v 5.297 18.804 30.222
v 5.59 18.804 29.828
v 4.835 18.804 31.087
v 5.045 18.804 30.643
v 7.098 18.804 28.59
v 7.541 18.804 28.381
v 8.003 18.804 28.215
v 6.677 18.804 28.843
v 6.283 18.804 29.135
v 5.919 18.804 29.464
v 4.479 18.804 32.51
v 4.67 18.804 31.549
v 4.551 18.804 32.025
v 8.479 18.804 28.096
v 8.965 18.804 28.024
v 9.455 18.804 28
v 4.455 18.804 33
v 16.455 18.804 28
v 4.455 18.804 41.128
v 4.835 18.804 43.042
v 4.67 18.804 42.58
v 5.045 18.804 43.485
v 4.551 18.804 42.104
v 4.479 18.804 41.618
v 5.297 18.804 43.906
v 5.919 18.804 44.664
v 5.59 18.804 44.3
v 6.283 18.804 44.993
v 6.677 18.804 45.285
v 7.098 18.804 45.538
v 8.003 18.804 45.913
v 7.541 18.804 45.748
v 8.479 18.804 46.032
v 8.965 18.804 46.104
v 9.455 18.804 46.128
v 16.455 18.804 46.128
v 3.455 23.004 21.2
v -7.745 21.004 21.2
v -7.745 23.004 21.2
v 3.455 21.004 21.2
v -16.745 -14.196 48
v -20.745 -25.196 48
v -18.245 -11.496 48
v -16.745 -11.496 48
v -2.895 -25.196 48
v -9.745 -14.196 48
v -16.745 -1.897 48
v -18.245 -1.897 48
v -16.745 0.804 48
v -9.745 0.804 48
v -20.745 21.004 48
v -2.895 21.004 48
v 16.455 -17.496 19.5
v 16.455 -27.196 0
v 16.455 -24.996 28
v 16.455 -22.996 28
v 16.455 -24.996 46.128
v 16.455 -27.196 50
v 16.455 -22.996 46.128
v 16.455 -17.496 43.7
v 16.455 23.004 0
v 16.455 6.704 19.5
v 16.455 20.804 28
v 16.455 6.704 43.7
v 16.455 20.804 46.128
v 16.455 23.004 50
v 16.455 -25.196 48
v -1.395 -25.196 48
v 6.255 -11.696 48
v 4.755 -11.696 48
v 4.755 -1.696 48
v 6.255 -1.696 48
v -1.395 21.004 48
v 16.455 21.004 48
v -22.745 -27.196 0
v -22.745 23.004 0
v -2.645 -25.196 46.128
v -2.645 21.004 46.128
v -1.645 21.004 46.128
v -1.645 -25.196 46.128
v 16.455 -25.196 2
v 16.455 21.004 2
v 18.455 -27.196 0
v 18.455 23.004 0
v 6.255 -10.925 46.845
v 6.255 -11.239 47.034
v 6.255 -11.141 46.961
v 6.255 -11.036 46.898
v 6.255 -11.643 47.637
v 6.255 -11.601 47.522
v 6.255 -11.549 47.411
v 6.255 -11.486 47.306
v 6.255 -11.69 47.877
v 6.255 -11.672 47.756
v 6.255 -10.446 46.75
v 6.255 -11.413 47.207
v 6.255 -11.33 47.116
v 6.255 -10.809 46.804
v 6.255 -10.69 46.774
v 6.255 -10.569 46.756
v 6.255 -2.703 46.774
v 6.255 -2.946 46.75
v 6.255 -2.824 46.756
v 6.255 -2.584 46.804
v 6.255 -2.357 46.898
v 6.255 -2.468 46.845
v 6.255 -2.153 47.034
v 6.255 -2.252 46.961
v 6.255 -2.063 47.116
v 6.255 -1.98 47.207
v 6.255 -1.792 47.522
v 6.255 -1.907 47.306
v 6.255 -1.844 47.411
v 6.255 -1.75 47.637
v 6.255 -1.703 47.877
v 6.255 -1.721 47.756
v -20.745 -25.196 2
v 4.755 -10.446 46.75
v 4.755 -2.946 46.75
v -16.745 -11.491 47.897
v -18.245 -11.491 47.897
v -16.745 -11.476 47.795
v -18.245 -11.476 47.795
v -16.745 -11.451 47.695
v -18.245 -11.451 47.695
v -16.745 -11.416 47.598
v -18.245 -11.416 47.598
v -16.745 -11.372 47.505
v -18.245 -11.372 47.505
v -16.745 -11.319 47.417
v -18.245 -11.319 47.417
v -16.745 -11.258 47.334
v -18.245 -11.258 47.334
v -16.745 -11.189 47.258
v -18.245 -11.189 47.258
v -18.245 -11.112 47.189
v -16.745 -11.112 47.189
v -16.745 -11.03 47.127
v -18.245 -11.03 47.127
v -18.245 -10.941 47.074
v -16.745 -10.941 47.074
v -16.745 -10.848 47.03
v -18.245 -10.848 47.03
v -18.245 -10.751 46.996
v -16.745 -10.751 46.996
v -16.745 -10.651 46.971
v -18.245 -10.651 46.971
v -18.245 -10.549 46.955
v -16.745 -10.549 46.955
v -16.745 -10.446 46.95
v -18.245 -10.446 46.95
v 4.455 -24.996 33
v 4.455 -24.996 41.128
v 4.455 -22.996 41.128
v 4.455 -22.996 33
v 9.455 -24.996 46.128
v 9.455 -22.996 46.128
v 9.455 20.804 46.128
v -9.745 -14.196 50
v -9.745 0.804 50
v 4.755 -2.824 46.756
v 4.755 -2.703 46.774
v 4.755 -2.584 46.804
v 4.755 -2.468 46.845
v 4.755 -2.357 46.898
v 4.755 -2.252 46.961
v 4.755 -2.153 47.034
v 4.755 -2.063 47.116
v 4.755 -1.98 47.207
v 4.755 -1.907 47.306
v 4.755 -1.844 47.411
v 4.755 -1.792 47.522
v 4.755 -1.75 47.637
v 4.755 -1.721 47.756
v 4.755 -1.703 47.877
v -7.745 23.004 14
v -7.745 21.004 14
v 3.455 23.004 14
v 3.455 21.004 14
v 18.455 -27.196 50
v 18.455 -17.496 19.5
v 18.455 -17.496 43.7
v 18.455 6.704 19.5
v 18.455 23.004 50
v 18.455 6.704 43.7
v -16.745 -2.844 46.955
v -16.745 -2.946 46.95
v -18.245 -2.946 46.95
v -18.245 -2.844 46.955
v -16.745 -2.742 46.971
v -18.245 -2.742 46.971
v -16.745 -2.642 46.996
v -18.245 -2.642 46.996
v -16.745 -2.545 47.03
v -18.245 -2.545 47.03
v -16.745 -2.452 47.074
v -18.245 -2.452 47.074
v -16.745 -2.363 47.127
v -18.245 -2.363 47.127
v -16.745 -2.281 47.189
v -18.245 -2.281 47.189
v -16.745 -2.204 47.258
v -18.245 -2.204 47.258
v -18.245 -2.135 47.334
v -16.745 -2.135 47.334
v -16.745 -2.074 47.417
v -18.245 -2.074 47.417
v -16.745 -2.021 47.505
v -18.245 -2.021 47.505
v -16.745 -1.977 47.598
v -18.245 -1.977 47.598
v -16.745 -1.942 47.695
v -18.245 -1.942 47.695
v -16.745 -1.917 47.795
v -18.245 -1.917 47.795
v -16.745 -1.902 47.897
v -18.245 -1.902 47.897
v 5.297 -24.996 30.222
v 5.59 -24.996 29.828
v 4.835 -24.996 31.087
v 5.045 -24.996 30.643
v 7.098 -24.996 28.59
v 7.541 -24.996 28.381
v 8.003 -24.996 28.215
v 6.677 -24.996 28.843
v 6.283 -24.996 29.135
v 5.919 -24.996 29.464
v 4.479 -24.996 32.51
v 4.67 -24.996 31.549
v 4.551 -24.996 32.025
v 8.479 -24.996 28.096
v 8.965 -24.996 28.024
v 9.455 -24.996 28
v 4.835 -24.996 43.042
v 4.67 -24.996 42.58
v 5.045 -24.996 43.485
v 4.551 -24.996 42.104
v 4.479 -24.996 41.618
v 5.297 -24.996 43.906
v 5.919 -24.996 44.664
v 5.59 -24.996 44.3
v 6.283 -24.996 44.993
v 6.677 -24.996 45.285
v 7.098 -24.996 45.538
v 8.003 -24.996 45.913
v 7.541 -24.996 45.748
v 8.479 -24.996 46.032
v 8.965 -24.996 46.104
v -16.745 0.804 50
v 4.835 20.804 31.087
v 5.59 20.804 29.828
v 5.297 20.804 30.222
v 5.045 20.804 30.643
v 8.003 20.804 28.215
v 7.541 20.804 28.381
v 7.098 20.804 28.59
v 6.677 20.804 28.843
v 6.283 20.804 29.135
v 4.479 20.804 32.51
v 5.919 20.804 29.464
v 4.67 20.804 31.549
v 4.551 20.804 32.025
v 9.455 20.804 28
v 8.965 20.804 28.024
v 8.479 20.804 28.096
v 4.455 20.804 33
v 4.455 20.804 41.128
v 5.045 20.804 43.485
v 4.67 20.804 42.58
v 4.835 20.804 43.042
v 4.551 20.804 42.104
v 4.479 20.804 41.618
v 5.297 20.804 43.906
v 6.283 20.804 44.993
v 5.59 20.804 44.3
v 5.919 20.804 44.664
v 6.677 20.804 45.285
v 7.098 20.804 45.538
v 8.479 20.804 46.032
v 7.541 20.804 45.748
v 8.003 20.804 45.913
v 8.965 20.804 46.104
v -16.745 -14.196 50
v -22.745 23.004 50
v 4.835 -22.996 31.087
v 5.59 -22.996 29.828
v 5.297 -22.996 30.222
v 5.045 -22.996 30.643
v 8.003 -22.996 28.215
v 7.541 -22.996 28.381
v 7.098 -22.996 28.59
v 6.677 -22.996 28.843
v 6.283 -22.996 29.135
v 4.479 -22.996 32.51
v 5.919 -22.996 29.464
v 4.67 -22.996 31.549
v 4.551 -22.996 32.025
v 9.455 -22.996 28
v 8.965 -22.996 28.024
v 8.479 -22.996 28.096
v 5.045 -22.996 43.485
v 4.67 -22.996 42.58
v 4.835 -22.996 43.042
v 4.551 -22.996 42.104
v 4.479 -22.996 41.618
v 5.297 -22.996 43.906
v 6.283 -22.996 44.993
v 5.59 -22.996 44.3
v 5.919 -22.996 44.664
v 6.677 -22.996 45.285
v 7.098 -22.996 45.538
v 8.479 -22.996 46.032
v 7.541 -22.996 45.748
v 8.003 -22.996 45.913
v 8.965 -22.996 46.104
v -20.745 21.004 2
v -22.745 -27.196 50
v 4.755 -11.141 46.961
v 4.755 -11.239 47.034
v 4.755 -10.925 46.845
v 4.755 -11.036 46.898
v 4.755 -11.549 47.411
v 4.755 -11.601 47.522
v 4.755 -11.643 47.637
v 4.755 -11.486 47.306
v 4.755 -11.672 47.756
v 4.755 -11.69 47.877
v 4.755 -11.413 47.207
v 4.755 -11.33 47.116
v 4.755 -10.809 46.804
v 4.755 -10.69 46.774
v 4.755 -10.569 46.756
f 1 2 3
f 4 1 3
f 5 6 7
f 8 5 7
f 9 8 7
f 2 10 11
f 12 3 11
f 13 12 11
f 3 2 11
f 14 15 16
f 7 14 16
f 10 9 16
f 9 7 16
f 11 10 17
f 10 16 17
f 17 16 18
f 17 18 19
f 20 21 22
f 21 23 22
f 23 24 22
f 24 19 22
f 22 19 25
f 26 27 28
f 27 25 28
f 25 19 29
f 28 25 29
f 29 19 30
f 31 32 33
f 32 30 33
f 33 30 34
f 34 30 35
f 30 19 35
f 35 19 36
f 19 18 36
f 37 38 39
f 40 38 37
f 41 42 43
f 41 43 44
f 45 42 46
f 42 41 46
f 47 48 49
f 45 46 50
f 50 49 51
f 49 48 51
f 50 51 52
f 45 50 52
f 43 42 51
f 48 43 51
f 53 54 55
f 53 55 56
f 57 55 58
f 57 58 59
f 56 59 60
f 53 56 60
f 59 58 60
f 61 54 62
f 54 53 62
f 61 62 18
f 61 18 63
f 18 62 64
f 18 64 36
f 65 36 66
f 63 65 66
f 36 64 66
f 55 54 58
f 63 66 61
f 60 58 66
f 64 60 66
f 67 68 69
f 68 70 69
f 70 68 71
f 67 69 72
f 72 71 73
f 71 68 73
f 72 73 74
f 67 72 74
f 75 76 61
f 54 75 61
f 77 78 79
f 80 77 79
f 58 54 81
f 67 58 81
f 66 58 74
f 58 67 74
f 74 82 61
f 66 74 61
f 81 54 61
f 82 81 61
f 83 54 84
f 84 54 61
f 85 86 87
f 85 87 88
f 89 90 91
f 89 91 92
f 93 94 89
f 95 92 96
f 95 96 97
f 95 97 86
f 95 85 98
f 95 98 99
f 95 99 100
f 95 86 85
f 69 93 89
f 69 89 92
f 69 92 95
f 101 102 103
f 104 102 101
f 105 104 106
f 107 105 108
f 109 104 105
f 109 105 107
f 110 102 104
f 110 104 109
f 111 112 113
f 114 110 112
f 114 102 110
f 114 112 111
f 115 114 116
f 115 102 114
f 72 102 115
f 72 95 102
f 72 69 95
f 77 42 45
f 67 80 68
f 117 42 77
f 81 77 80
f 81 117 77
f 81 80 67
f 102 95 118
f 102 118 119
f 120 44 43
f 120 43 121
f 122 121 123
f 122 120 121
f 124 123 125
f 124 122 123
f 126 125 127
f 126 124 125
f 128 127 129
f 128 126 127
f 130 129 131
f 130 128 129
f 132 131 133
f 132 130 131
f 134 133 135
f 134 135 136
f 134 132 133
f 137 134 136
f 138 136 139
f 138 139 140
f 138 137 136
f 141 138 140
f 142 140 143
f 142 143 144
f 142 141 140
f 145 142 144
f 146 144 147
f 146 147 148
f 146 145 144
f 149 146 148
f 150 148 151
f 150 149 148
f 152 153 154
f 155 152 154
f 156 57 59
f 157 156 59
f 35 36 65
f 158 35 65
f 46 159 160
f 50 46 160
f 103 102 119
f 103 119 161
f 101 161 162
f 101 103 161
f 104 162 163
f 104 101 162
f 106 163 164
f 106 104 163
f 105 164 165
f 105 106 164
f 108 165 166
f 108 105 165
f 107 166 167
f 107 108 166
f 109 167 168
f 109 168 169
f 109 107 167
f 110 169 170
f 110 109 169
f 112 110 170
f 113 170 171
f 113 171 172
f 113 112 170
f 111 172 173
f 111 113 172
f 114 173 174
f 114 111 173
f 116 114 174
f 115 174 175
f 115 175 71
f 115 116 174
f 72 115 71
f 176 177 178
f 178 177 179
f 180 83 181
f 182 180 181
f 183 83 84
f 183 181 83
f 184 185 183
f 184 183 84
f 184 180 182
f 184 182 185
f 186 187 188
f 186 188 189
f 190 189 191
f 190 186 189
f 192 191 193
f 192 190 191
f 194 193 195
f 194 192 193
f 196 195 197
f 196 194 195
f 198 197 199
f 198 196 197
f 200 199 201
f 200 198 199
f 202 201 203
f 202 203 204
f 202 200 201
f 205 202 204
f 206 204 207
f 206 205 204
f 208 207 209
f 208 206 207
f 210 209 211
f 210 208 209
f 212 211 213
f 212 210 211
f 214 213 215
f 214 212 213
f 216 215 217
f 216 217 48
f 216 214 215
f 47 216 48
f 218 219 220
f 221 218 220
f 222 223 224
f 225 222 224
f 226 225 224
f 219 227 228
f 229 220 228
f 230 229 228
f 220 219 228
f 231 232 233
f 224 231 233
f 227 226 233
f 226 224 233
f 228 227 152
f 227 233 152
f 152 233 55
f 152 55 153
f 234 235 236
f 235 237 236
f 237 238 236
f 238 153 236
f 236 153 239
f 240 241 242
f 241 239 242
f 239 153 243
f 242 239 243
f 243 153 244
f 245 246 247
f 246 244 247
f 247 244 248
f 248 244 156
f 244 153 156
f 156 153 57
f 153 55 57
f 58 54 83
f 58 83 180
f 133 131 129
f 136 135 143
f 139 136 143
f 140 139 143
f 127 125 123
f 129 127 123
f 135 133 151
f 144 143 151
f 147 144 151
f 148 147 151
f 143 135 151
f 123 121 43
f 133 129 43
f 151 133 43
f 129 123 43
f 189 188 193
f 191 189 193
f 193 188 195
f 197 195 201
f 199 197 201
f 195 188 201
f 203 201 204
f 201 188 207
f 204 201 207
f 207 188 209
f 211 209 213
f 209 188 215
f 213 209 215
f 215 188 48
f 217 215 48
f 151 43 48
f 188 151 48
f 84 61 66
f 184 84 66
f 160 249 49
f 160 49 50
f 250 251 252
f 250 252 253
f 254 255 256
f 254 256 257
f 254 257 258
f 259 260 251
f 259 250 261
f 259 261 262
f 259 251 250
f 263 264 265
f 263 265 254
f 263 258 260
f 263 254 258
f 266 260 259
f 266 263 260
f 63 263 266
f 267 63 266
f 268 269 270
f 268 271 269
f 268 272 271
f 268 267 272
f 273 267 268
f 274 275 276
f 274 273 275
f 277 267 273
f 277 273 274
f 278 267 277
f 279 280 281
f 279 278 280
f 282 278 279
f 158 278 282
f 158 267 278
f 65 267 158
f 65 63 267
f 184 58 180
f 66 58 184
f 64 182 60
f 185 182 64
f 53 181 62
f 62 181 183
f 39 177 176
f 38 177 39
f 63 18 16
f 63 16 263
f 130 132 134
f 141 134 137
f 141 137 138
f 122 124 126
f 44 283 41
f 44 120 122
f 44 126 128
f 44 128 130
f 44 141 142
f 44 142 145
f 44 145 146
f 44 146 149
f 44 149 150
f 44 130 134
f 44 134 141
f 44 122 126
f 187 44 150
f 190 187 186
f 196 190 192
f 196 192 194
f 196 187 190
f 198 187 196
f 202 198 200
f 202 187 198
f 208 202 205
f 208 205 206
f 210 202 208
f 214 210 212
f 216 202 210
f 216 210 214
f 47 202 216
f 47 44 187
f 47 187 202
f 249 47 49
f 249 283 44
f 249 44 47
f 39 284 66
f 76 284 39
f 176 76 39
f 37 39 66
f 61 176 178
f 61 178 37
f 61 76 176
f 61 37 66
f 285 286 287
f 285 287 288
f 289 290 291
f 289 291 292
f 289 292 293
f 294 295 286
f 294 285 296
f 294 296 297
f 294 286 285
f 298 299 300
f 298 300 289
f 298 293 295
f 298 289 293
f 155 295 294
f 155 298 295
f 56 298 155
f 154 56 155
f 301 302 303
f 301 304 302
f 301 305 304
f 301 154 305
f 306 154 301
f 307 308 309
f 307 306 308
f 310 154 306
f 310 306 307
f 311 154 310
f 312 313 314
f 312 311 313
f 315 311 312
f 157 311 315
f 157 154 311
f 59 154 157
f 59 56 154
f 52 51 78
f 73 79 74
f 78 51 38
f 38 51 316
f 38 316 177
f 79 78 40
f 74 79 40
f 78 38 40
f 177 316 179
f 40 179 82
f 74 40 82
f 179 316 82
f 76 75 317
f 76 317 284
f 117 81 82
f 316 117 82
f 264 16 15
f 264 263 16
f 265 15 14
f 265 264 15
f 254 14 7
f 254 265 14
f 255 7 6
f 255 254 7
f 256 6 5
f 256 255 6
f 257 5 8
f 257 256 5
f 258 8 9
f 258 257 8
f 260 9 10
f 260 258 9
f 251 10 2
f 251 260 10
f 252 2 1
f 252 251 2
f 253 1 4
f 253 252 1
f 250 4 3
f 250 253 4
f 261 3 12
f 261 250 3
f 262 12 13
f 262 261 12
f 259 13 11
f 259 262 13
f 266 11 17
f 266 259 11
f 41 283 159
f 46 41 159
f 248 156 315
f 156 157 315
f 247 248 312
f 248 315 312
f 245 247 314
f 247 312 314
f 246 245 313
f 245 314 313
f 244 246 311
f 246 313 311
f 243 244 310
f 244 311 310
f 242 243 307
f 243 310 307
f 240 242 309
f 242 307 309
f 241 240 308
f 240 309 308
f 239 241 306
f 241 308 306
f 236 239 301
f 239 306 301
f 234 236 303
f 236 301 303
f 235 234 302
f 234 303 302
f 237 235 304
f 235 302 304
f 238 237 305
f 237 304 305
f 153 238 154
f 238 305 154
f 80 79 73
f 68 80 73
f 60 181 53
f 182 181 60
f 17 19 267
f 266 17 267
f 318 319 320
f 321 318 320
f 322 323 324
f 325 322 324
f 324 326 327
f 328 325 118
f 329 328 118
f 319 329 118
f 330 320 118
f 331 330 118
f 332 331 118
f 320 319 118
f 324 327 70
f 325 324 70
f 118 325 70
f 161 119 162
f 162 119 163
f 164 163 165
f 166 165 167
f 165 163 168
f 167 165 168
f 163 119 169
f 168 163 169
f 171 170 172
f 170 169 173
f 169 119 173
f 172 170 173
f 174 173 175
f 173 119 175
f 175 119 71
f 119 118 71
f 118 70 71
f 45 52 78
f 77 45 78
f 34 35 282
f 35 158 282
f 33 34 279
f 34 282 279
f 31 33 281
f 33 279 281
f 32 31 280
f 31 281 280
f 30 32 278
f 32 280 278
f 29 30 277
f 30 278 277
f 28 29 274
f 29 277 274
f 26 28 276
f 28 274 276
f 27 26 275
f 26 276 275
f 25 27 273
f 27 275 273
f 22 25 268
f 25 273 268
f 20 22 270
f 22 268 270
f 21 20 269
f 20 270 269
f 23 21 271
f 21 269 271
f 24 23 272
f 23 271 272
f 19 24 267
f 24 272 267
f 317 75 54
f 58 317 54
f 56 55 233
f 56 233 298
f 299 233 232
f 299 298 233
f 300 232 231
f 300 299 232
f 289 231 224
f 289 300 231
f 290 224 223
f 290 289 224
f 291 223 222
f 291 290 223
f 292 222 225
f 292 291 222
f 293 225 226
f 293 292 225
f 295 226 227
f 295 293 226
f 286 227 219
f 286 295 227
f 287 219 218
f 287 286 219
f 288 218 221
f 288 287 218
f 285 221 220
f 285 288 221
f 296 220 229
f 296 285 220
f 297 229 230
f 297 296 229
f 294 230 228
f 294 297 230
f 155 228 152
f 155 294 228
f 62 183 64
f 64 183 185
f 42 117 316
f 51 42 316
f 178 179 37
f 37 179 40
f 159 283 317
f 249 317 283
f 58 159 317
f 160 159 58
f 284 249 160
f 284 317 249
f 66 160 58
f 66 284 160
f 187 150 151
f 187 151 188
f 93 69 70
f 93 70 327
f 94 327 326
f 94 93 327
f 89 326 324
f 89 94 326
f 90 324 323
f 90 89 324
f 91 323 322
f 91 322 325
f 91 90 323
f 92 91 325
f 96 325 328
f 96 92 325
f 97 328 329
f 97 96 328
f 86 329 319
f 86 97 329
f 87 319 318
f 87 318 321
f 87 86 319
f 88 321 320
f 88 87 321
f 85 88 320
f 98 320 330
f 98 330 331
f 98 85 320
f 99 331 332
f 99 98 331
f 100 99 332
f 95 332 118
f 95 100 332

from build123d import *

# Parameters (mm, degrees)
F0_W      = 39.2
F0_H      = 50.2
F0_W_2    = 35.2
F0_H_2    = 46.2
F1_DEPTH  = 2
F2_DEPTH  = 50
F3_W      = 46.2
F3_H      = 4
F3_H_2    = 42
F4_DEPTH  = 25
F5_W      = 35.2
F5_H      = 46.2
F5_W_2    = 7
F5_H_2    = 15
F6_DEPTH  = 2
F8_DEPTH  = 1.5
F10_DEPTH = 46.2
F11_W     = 50.2
F11_H     = 50
F11_W_2   = 0.2
F11_H_2   = 1.8718592376
F11_H_3   = 18.1281407624
F11_W_3   = 2
F11_W_4   = 41.8
F12_DEPTH = 2
F13_DEPTH = 12
F14_R     = 5
F15_W     = 24.2
F15_H     = 24.2
F16_DEPTH = 5
F17_W     = 11.2
F17_H     = 7.2
F18_DEPTH = 4.5
F20_START = -10.2
F20_DEPTH = 1.5


# Not quite as in the source:
# - a feature names something its author has since deleted; it is built from what else it names


with BuildPart() as f1:
    # F0 (on Top) → F1 (new body)
    with BuildSketch(Plane.XY):
        with Locations((-3.1452118158, -2.0964890861)):
            Rectangle(F0_W, F0_H)
        with Locations((-3.1452118158, -2.0964890861)):
            Rectangle(F0_W_2, F0_H_2, mode=Mode.SUBTRACT)
        with Locations((-3.1452118158, -2.0964890861)):
            Rectangle(F0_W_2, F0_H_2)
    extrude(amount=F1_DEPTH)

    # F0 (on Top) → F2 (join)
    with BuildSketch(Plane.XY):
        with Locations((-3.1452118158, -2.0964890861)):
            Rectangle(F0_W, F0_H)
        with Locations((-3.1452118158, -2.0964890861)):
            Rectangle(F0_W_2, F0_H_2, mode=Mode.SUBTRACT)
    extrude(amount=F2_DEPTH)

    # F3 (on face) → F4 (cut)
    with BuildSketch(Plane.YZ.offset(16.4547881842)):
        with Locations((-2.0964890861, 46)):
            Rectangle(F3_W, F3_H)
        with Locations((-2.0964890861, 23)):
            Rectangle(F3_W, F3_H_2)
    extrude(amount=-F4_DEPTH, mode=Mode.SUBTRACT)

    # F5 (on face) → F6 (join)
    with BuildSketch(Plane.XY.offset(50)):
        with Locations((-3.1452118158, -2.0964890861)):
            Rectangle(F5_W, F5_H)
        with Locations((-13.2452118158, -6.6964890861)):
            Rectangle(F5_W_2, F5_H_2, mode=Mode.SUBTRACT)
    extrude(amount=-F6_DEPTH)

    # F7 (on face) → F8 (join)
    with BuildSketch(Plane.YZ.offset(-16.7452118158)):
        with BuildLine():
            ThreePointArc((-2.9464890861, 46.9503788089), (-3.688683348, 47.2578057381), (-3.9961102772, 48))
            Line((-3.9961102772, 48), (-6.6964890861, 48))
            Line((-6.6964890861, 48), (-9.396867895, 48))
            ThreePointArc((-9.396867895, 48), (-9.7042948242, 47.2578057381), (-10.4464890861, 46.9503788089))
            Line((-10.4464890861, 46.9503788089), (-2.9464890861, 46.9503788089))
        make_face()
        with BuildLine():
            ThreePointArc((-2.9464890861, 46.9503788089), (-2.2042948242, 47.2578057381), (-1.896867895, 48))
            Line((-1.896867895, 48), (-3.9961102772, 48))
            ThreePointArc((-3.9961102772, 48), (-3.688683348, 47.2578057381), (-2.9464890861, 46.9503788089))
        make_face()
        with BuildLine():
            ThreePointArc((-11.4961102772, 48), (-11.188683348, 47.2578057381), (-10.4464890861, 46.9503788089))
            ThreePointArc((-10.4464890861, 46.9503788089), (-9.7042948242, 47.2578057381), (-9.396867895, 48))
            Line((-9.396867895, 48), (-11.4961102772, 48))
        make_face()
    extrude(amount=-F8_DEPTH)

    # F9 (on face) → F10 (join, through all)
    with BuildSketch(Plane.XZ.offset(-21.0035109139)):
        Polygon((-2.6452118158, 46.1281407624), (-2.1452118158, 46.1281407624), (-1.6452118158, 46.1281407624), (-1.3952118158, 48), (-2.1452118158, 48), (-2.8952118158, 48), align=None)
    extrude(amount=F10_DEPTH)

    # F17 (on face) → F18 (cut)
    with BuildSketch(Plane.XZ.offset(-21.0035109139)):
        with Locations((-2.1452118158, 17.6)):
            Rectangle(F17_W, F17_H)
    extrude(amount=-F18_DEPTH, mode=Mode.SUBTRACT)

    # F19 (on face) → F20 (join)
    with BuildSketch(Plane.YZ.offset(16.4547881842).offset(F20_START)):
        with BuildLine():
            ThreePointArc((-11.6964890861, 48), (-11.3303725626, 47.1161165235), (-10.4464890861, 46.75))
            ThreePointArc((-10.4464890861, 46.75), (-9.5626056096, 47.1161165235), (-9.1964890861, 48))
            Line((-9.1964890861, 48), (-11.6964890861, 48))
        make_face()
        with BuildLine():
            Line((-10.4464890861, 46.75), (-2.9464890861, 46.75))
            ThreePointArc((-2.9464890861, 46.75), (-3.8303725626, 47.1161165235), (-4.1964890861, 48))
            Line((-4.1964890861, 48), (-6.6964890861, 48))
            Line((-6.6964890861, 48), (-9.1964890861, 48))
            ThreePointArc((-9.1964890861, 48), (-9.5626056096, 47.1161165235), (-10.4464890861, 46.75))
        make_face()
        with BuildLine():
            ThreePointArc((-4.1964890861, 48), (-3.8303725626, 47.1161165235), (-2.9464890861, 46.75))
            ThreePointArc((-2.9464890861, 46.75), (-2.0626056096, 47.1161165235), (-1.6964890861, 48))
            Line((-1.6964890861, 48), (-4.1964890861, 48))
        make_face()
    extrude(amount=-F20_DEPTH)


with BuildPart() as f12:
    # F11 (on face) → F12 (new body)
    with BuildSketch(Plane.YZ.offset(16.4547881842)):
        with Locations((-2.0964890861, 25)):
            Rectangle(F11_W, F11_H)
        Polygon((20.8035109139, 48), (21.0035109139, 48), (21.0035109139, 46.1281407624), (21.0035109139, 28), (21.0035109139, 2), (-25.1964890861, 2), (-25.1964890861, 28), (-25.1964890861, 46.1281407624), (-25.1964890861, 48), (-24.9964890861, 48), (-22.9964890861, 48), (18.8035109139, 48), align=None, mode=Mode.SUBTRACT)
        with Locations((20.9035109139, 47.0640703812)):
            Rectangle(F11_W_2, F11_H_2)
        with Locations((20.9035109139, 37.0640703812)):
            Rectangle(F11_W_2, F11_H_3)
        with Locations((19.8035109139, 47.0640703812)):
            Rectangle(F11_W_3, F11_H_2)
        Polygon((21.0035109139, 2), (21.0035109139, 28), (20.8035109139, 28), (18.8035109139, 28), (-22.9964890861, 28), (-24.9964890861, 28), (-25.1964890861, 28), (-25.1964890861, 2), align=None)
        with Locations((19.8035109139, 37.0640703812)):
            Rectangle(F11_W_3, F11_H_3)
        with Locations((-2.0964890861, 47.0640703812)):
            Rectangle(F11_W_4, F11_H_2)
        with Locations((-2.0964890861, 37.0640703812)):
            Rectangle(F11_W_4, F11_H_3)
        with Locations((-23.9964890861, 47.0640703812)):
            Rectangle(F11_W_3, F11_H_2)
        with Locations((-23.9964890861, 37.0640703812)):
            Rectangle(F11_W_3, F11_H_3)
        with Locations((-25.0964890861, 47.0640703812)):
            Rectangle(F11_W_2, F11_H_2)
        with Locations((-25.0964890861, 37.0640703812)):
            Rectangle(F11_W_2, F11_H_3)
    extrude(amount=F12_DEPTH)

    # F11 (on face) → F13 (join)
    with BuildSketch(Plane.YZ.offset(16.4547881842)):
        with Locations((19.8035109139, 37.0640703812)):
            Rectangle(F11_W_3, F11_H_3)
        with Locations((-23.9964890861, 37.0640703812)):
            Rectangle(F11_W_3, F11_H_3)
    extrude(amount=-F13_DEPTH)

    # F14
    f14_edges = [f12.edges().sort_by_distance(p)[0] for p in [
        (4.454788, 19.803511, 46.128141),
        (4.454788, -23.996489, 46.128141),
        (4.454788, -23.996489, 28),
        (4.454788, 19.803511, 28),
    ]]
    fillet(f14_edges, radius=F14_R)

    # F15 (on face) → F16 (cut)
    with BuildSketch(Plane.YZ.offset(18.4547881842)):
        with Locations((-5.3964890861, 31.6)):
            Rectangle(F15_W, F15_H)
    extrude(amount=-F16_DEPTH, mode=Mode.SUBTRACT)


solid = Compound([f1.part, f12.part])
